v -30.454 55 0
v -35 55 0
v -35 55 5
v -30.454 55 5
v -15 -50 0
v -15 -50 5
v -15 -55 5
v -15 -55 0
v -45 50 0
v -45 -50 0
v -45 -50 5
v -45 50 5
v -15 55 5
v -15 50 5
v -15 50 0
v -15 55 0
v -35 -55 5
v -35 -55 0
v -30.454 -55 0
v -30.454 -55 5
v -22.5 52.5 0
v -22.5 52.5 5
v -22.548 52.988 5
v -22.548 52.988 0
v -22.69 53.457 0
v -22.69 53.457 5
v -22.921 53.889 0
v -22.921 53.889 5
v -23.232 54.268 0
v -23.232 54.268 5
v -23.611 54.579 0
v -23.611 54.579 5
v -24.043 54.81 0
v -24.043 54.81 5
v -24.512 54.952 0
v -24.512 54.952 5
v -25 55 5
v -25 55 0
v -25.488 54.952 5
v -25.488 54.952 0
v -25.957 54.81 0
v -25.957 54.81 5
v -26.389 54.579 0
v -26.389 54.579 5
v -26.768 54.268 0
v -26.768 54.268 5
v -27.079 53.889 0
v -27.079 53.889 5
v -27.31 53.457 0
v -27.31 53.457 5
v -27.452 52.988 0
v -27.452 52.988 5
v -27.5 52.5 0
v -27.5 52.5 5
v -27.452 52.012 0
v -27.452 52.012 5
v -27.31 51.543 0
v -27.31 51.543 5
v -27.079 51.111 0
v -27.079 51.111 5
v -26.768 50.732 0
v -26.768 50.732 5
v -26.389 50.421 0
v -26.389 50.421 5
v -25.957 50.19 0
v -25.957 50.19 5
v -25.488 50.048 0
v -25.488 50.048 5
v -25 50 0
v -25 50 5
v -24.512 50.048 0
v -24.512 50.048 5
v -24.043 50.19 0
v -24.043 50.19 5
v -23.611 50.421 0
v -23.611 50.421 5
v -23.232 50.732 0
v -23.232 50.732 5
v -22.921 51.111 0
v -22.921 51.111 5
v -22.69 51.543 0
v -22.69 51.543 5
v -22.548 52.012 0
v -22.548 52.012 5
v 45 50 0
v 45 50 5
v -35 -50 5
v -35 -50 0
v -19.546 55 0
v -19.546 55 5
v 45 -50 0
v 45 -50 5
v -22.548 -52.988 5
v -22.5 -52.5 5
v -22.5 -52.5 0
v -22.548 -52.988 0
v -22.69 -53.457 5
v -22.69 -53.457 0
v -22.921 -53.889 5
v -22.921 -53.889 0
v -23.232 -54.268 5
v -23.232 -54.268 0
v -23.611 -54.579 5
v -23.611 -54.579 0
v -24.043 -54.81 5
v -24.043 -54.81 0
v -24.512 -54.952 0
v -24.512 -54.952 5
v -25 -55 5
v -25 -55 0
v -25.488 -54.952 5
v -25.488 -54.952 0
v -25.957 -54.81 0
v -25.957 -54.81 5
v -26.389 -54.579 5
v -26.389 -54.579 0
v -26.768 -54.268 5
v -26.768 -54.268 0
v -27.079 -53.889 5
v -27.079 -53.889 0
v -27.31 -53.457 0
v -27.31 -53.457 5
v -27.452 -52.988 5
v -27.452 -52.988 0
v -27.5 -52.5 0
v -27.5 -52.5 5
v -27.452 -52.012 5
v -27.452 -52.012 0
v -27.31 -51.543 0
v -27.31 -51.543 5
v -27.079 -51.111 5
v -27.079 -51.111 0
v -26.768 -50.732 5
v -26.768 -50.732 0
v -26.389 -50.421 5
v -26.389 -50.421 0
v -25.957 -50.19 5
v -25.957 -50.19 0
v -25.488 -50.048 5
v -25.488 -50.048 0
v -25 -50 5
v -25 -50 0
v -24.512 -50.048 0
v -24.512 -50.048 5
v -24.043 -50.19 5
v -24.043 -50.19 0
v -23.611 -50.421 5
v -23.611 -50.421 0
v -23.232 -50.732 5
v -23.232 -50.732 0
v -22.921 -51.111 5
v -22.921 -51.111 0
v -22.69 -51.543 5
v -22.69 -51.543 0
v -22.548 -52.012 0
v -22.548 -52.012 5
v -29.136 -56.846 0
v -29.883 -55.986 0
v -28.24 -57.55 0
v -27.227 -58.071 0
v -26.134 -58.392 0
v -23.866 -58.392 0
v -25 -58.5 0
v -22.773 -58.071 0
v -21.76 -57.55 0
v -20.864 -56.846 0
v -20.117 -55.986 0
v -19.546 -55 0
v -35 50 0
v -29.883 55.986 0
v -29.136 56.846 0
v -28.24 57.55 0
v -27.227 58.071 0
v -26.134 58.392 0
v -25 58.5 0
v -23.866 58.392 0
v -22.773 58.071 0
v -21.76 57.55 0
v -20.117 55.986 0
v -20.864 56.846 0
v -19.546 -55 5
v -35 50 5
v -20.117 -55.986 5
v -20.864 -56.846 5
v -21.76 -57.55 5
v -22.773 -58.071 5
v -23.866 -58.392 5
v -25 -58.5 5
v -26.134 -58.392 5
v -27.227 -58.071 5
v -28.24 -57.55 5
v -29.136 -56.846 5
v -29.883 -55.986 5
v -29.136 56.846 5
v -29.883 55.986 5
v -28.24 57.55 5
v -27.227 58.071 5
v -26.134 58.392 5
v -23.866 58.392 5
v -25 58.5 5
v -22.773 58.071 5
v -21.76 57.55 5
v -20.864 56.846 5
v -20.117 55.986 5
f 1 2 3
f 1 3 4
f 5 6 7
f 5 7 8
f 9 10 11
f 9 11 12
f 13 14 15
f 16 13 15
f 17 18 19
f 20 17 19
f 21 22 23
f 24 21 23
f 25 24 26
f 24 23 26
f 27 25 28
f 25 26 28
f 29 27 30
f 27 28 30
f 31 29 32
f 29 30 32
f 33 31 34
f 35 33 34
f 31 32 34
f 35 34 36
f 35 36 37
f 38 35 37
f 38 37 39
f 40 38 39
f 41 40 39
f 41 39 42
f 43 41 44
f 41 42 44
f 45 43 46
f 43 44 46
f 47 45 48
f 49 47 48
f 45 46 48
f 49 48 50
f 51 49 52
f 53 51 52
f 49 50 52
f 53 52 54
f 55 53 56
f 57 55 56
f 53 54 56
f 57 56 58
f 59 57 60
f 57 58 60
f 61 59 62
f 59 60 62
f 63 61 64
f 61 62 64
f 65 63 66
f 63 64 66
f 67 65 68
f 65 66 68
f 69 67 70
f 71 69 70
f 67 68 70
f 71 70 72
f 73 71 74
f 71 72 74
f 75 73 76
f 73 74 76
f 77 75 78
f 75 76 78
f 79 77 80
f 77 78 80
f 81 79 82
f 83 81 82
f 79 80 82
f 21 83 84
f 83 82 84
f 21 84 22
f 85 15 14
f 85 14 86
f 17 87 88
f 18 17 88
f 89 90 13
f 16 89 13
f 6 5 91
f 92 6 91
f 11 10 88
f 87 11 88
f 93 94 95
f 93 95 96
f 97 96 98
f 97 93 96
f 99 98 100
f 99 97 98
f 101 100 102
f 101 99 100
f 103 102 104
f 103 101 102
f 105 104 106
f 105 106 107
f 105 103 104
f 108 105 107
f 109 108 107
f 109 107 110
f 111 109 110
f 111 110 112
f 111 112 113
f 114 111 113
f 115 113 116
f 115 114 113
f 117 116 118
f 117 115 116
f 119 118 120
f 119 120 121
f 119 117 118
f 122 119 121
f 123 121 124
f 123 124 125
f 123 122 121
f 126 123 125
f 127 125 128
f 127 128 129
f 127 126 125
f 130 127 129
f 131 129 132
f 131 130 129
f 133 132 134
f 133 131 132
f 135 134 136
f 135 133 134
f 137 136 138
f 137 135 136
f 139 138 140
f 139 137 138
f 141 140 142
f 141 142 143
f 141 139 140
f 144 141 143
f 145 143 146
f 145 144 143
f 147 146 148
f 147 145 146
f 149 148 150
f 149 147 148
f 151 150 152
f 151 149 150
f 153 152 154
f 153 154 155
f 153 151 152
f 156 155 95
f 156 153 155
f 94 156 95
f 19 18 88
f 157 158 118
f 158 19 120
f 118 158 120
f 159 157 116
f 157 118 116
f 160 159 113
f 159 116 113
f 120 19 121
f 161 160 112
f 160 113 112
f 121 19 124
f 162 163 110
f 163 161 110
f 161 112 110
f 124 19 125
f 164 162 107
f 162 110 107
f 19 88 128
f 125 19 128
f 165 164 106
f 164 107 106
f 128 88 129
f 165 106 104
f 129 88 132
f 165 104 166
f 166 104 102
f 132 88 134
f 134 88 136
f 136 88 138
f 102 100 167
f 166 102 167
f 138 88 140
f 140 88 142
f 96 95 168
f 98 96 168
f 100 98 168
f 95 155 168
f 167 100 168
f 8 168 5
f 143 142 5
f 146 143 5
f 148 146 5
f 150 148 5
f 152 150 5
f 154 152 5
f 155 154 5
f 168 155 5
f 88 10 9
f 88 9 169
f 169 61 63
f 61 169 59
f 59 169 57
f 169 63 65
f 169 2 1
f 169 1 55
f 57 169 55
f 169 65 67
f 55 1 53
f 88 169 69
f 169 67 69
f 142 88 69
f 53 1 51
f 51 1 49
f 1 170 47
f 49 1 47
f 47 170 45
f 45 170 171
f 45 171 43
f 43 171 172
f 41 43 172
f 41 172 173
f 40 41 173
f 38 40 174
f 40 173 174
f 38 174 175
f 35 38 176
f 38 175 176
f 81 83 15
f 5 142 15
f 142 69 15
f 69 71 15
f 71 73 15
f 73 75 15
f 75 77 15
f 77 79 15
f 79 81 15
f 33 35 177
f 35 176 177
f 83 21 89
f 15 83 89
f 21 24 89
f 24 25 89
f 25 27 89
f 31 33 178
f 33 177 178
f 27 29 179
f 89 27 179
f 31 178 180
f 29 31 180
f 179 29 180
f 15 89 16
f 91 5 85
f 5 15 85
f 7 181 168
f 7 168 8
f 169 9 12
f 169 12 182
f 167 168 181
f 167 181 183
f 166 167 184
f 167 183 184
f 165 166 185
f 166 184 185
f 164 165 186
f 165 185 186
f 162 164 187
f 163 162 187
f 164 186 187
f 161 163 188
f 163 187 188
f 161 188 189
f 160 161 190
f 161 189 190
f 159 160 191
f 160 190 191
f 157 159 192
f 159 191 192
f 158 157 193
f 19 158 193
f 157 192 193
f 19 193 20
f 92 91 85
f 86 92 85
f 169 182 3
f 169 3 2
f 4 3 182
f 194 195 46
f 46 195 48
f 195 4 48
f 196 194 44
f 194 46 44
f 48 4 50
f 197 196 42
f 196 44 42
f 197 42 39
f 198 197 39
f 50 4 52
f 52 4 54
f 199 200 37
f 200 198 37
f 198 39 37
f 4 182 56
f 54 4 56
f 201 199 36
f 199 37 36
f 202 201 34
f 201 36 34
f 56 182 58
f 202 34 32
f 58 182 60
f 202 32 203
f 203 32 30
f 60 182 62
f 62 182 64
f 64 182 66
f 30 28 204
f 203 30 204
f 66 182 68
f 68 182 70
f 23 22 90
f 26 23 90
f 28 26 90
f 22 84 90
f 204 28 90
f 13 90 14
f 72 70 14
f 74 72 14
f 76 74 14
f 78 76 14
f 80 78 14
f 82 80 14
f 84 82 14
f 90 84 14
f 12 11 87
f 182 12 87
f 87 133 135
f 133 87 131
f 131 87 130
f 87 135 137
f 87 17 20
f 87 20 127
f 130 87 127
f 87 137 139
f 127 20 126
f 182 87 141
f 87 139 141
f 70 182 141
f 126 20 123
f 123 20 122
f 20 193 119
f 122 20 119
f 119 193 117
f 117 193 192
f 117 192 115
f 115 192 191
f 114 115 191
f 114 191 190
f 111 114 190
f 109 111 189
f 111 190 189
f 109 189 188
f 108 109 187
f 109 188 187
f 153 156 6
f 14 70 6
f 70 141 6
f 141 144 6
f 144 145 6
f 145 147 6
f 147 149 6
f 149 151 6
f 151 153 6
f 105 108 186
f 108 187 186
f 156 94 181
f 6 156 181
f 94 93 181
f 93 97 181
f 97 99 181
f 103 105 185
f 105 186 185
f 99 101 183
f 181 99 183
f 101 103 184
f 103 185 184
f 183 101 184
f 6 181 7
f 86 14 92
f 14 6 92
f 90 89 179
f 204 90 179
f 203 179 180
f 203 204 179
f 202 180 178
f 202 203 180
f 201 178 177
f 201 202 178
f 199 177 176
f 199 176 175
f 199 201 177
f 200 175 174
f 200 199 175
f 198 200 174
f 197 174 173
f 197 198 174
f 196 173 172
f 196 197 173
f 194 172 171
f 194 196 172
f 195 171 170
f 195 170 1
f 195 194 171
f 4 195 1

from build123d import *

# Parameters (mm, degrees)
SKETCH1_W           = 90
SKETCH1_H           = 100
BOSS_EXTRUDE1_DEPTH = 5
SKETCH2_W           = 20
SKETCH2_H           = 5
BOSS_EXTRUDE2_DEPTH = 5
SKETCH3_R           = 6
BOSS_EXTRUDE3_DEPTH = 5
SKETCH4_R           = 2.5
CUT_EXTRUDE1_DEPTH  = 5


with BuildPart() as part:
    # Sketch1 → Boss-Extrude1 (new body)
    with BuildSketch(Plane.XY):
        Rectangle(SKETCH1_W, SKETCH1_H)
    extrude(amount=BOSS_EXTRUDE1_DEPTH)

    # Sketch2 → Boss-Extrude2 (add)
    with BuildSketch(Plane(origin=(0, 50, 0), x_dir=(1, 0, 0), z_dir=(0, 1, 0))):
        with Locations((-25, -2.5)):
            Rectangle(SKETCH2_W, SKETCH2_H)
    boss_extrude2 = extrude(amount=BOSS_EXTRUDE2_DEPTH)

    # Mirror1: Boss-Extrude2 across plane
    add(boss_extrude2.mirror(Plane.ZX))

    # Sketch3 → Boss-Extrude3 (add)
    with BuildSketch(Plane.XY.offset(5)):
        with Locations((-25, 52.5)):
            Circle(SKETCH3_R)
    boss_extrude3 = extrude(amount=-BOSS_EXTRUDE3_DEPTH)

    # Sketch4 → Cut-Extrude1 (cut)
    with BuildSketch(Plane.XY.offset(5)):
        with Locations((-25, 52.5)):
            Circle(SKETCH4_R)
    cut_extrude1 = extrude(amount=-CUT_EXTRUDE1_DEPTH, mode=Mode.SUBTRACT)

    # Mirror2: Boss-Extrude3, Cut-Extrude1 across plane
    add(boss_extrude3.mirror(Plane.ZX))
    add(cut_extrude1.mirror(Plane.ZX), mode=Mode.SUBTRACT)


solid = part.part
